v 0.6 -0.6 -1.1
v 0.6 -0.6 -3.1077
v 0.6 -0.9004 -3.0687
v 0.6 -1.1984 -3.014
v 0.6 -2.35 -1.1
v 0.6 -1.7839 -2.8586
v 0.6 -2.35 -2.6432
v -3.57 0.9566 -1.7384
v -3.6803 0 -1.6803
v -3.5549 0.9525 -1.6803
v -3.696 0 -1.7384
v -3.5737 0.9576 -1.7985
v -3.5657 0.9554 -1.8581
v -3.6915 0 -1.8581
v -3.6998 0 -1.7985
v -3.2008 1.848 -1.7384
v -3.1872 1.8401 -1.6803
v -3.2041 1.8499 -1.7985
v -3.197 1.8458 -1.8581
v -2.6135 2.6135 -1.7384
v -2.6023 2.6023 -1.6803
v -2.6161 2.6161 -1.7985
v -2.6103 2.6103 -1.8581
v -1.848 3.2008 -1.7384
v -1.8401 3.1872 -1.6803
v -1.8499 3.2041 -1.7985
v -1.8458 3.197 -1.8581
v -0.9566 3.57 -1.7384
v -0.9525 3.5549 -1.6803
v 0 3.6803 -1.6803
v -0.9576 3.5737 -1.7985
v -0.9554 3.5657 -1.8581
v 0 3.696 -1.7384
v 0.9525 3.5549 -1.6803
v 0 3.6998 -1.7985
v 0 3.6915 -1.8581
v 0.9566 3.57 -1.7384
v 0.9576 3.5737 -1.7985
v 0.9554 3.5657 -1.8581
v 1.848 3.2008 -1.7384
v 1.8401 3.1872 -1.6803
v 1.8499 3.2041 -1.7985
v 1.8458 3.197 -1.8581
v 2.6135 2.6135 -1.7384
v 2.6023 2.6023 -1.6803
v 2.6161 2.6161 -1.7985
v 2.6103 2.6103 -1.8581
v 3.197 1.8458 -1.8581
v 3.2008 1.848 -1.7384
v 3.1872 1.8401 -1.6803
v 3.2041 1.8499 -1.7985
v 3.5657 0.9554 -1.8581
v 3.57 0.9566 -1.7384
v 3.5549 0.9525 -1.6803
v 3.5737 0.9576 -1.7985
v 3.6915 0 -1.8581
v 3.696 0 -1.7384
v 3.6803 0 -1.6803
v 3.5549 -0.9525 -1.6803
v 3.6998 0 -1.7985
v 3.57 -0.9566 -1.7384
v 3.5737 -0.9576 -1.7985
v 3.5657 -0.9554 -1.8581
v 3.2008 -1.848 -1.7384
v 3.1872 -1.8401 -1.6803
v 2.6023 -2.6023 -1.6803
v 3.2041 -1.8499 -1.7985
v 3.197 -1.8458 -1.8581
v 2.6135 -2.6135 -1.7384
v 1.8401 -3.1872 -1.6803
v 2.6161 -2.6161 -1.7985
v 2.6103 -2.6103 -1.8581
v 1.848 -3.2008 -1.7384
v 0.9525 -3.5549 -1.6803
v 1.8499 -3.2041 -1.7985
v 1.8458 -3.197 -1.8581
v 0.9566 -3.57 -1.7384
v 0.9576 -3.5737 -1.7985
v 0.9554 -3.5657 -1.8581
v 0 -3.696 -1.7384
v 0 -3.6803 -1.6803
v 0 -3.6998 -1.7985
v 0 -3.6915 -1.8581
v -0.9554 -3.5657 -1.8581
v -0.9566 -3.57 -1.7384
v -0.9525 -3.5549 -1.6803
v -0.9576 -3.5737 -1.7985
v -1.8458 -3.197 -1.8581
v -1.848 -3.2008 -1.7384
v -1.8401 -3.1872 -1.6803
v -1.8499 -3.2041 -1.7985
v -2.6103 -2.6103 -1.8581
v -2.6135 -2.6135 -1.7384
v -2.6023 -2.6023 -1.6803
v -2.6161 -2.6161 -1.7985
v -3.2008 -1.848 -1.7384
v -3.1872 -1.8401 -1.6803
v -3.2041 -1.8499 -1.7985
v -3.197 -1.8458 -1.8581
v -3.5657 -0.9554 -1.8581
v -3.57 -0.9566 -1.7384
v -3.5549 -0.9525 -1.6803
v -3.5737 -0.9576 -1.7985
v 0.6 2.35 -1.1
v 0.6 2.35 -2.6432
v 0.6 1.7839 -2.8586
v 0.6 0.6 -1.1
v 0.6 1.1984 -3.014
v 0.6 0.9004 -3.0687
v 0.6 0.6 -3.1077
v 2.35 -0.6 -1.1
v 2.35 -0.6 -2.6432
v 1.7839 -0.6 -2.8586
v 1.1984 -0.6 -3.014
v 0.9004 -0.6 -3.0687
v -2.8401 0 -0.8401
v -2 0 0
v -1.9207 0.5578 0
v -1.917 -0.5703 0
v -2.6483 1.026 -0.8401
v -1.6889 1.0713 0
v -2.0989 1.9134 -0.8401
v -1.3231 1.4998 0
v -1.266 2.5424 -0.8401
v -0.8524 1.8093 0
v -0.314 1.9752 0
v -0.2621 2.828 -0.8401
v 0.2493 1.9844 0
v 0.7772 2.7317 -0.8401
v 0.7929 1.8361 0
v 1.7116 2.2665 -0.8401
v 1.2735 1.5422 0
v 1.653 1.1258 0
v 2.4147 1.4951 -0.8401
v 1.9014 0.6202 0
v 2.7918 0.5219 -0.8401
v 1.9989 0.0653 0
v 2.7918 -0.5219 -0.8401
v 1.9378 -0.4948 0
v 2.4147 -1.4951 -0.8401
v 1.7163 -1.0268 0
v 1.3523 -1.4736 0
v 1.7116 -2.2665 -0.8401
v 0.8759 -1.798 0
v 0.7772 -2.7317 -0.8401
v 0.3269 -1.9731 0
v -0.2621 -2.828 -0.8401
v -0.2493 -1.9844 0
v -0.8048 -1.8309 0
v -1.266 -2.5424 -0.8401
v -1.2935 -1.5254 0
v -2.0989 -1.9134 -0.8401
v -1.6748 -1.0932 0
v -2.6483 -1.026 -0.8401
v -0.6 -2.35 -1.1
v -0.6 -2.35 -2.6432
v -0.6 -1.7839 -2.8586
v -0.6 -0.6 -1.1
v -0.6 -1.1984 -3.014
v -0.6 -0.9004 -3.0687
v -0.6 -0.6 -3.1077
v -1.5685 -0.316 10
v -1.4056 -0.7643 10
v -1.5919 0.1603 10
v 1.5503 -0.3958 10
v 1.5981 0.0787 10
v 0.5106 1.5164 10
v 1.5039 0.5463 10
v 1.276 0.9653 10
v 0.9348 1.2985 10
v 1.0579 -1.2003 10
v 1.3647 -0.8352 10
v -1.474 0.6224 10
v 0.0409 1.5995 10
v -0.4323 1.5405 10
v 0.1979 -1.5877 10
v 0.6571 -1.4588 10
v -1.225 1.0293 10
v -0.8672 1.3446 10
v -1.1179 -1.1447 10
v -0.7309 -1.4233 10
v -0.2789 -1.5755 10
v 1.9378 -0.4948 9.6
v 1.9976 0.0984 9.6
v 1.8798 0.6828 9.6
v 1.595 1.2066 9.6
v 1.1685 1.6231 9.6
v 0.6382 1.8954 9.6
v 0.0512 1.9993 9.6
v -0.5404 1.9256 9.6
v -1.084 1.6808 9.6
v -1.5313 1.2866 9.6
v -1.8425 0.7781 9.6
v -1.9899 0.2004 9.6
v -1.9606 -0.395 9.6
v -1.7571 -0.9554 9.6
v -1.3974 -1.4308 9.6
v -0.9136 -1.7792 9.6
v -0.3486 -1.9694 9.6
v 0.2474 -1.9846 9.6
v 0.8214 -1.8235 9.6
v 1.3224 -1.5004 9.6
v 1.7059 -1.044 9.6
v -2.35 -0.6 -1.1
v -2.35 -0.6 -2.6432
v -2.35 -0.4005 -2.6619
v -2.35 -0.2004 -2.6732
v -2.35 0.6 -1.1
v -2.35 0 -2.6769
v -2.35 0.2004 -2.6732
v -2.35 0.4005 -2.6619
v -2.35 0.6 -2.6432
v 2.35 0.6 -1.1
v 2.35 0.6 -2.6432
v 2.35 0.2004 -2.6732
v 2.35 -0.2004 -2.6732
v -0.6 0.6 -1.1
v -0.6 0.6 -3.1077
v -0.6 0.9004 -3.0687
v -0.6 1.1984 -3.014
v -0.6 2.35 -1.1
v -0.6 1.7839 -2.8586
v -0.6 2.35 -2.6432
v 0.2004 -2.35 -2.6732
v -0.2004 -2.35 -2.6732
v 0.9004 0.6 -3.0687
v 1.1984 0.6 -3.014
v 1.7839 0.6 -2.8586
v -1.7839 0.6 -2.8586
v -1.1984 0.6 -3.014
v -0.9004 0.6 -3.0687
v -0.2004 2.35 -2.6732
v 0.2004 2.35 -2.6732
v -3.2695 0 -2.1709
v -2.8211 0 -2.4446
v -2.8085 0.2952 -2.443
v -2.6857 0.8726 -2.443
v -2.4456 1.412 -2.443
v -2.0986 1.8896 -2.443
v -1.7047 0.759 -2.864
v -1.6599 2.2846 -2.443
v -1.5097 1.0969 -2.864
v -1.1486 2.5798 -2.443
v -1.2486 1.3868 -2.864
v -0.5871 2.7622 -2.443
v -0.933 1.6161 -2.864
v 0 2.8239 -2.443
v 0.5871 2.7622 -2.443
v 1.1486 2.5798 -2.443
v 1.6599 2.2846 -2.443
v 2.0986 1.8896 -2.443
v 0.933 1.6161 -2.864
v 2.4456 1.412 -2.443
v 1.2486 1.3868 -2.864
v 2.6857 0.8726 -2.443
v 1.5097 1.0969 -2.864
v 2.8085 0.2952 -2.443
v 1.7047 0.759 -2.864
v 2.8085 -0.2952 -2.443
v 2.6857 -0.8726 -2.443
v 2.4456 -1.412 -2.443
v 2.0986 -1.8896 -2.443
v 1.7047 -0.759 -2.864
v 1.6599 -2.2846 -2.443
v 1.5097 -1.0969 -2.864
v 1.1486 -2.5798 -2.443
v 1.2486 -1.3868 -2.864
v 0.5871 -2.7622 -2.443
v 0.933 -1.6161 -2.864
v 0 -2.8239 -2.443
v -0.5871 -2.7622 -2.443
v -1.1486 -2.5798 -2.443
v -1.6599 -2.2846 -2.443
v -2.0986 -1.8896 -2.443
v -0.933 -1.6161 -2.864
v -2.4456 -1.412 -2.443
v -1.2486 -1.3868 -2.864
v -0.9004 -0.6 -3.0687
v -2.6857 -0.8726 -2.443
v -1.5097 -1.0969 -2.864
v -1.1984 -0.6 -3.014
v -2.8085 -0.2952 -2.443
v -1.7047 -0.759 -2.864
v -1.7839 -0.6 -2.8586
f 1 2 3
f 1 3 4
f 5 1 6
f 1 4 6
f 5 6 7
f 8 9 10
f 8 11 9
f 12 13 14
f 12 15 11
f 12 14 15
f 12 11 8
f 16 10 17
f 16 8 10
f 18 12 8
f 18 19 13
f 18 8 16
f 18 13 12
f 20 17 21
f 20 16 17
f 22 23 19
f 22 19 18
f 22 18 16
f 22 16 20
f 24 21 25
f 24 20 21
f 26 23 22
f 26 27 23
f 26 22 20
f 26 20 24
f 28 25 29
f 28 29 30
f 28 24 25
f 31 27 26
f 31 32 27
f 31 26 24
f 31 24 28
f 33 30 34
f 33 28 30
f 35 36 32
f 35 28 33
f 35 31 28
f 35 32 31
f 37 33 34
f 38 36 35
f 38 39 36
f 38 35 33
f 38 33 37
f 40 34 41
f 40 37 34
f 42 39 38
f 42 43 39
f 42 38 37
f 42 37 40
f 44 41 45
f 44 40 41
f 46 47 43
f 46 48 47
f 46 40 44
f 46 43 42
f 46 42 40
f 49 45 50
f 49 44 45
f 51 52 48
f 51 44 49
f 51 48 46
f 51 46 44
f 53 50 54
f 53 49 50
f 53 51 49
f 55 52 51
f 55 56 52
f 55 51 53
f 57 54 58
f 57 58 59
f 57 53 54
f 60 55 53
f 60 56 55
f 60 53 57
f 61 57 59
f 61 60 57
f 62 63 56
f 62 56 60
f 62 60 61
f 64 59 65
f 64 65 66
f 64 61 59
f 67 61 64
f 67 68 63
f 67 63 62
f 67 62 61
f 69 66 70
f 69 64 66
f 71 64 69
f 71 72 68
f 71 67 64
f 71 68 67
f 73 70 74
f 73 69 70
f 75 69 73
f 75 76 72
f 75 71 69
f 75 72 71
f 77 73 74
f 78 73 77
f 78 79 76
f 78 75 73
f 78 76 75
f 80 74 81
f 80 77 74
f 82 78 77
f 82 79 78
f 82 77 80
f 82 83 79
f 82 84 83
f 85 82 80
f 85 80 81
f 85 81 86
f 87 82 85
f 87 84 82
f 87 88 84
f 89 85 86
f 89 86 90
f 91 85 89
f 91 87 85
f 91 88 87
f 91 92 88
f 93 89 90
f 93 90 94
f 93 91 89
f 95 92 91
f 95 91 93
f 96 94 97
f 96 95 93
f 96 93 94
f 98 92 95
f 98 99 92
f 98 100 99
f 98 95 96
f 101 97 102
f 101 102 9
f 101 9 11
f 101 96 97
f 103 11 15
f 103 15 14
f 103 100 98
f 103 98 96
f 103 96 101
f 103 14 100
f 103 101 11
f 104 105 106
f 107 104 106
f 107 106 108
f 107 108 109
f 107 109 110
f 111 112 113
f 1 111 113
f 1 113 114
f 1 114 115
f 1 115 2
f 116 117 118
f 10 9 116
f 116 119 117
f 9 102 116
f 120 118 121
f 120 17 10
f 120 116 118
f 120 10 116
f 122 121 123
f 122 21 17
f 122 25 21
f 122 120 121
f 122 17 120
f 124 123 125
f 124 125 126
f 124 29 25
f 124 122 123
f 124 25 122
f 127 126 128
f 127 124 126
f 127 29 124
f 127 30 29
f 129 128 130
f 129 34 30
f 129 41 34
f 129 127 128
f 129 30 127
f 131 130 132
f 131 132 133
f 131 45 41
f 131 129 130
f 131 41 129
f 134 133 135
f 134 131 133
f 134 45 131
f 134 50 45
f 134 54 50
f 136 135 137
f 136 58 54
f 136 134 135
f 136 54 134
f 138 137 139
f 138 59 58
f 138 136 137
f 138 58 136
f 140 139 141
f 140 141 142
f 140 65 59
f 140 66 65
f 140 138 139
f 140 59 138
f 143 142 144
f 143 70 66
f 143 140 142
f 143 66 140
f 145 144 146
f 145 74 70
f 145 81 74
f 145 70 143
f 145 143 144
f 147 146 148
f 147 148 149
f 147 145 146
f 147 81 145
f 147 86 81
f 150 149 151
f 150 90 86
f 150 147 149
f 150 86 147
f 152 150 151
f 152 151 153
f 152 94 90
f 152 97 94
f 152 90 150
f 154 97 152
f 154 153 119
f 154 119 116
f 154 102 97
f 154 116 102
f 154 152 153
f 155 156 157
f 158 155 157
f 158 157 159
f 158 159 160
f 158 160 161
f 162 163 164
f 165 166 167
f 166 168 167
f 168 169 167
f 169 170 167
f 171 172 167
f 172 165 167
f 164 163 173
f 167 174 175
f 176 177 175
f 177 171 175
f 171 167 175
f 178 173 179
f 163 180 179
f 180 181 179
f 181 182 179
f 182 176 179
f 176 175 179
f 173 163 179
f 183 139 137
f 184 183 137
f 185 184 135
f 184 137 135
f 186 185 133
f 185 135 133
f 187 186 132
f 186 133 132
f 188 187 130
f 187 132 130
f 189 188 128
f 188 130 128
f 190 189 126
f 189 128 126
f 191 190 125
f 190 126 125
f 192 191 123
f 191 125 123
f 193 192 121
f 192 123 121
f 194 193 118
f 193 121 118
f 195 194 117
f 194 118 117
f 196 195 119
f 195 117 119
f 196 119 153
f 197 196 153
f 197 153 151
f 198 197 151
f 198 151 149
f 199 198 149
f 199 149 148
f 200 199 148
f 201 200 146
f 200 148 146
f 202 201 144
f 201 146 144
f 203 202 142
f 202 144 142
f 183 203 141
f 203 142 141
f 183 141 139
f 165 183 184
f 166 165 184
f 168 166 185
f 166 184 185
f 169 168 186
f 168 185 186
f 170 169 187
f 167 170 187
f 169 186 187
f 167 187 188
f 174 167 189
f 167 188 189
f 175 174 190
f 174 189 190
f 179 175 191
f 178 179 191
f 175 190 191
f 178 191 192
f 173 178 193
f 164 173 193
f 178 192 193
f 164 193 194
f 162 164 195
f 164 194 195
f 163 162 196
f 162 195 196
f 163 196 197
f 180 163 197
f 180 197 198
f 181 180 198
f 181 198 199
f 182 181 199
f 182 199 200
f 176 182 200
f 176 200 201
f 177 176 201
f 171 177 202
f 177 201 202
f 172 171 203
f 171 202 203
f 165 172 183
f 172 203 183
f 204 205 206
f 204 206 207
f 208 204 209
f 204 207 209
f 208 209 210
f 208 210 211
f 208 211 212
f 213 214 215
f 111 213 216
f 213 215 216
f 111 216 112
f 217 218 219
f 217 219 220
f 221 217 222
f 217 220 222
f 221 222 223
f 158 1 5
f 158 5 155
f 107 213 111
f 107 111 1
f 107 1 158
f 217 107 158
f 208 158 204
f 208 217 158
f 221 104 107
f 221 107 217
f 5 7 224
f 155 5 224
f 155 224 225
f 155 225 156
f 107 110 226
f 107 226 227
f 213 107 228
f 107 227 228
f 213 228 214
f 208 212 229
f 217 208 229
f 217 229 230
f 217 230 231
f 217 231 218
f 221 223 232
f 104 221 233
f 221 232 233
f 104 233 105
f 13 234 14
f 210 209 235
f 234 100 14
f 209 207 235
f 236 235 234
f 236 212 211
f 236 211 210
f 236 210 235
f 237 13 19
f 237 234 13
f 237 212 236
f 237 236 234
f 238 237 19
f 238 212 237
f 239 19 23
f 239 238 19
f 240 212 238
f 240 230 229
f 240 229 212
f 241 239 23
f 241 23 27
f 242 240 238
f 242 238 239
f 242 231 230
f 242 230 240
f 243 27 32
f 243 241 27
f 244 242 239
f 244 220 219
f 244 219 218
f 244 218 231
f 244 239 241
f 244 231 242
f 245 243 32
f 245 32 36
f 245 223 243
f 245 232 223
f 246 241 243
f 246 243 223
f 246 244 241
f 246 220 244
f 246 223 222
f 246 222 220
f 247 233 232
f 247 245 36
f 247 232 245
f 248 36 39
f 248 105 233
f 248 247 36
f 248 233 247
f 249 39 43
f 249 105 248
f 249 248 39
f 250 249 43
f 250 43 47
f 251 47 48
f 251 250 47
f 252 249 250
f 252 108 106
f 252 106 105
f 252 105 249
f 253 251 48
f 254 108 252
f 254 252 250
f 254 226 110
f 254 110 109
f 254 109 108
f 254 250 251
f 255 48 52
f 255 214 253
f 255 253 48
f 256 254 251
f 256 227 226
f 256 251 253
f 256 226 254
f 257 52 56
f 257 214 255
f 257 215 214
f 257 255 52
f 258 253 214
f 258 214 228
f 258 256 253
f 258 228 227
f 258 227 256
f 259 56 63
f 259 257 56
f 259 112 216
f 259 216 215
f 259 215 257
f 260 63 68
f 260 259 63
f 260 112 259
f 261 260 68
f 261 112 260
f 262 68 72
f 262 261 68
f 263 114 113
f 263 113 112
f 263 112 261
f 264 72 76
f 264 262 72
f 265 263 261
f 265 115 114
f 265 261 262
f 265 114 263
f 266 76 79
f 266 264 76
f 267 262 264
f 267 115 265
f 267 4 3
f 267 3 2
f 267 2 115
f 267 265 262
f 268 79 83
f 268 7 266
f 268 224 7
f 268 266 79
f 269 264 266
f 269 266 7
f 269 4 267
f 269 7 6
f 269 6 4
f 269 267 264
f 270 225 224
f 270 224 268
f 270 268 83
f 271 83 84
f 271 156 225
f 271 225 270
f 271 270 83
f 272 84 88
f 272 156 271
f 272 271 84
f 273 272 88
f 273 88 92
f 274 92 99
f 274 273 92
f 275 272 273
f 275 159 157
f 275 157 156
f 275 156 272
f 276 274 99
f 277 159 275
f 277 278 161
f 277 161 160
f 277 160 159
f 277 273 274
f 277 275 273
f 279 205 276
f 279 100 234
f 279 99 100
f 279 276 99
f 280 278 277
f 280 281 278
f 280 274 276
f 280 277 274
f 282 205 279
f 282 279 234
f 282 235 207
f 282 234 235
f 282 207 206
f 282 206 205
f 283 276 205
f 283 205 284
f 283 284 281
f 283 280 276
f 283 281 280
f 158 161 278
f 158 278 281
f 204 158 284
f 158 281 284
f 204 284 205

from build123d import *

# Parameters (mm, degrees)
ENLEV_MAT_EXTRU_1_DEPTH      = 1
ENLEV_MAT_EXTRU_1_DEPTH_BACK = 10
ESQUISSE3_W                  = 2
ESQUISSE3_H                  = 10
CHANFREIN1_SIZE              = 0.4
ENL_V_MAT_EXTRU_1_DEPTH      = 1


with BuildPart() as part:
    # Esquisse1 → Base-Révolution (revolve)
    with BuildSketch(Plane(origin=(0, 0, 0), x_dir=(1, 0, 0), z_dir=(0, 1, 0))):
        with BuildLine():
            Line((0, 0), (2, 0))
            Line((2, 0), (3.680261609, 1.680261609))
            ThreePointArc((3.680261609, 1.680261609), (3.699400389, 1.768324283), (3.691522185, 1.858097672))
            ThreePointArc((3.691522185, 1.858097672), (1.958780857, 2.831960417), (0, 3.169567743))
            Line((0, 3.169567743), (0, 0))
        make_face()
    revolve(axis=Axis((0, 0, 0), (0, 0, -1)))

    # Esquisse2 → Enlev. mat.-Extru.1 (cut, two sides: drawn at the far end of the back side and taken through both)
    with BuildSketch(Plane.XY.offset(-3.1).offset(-ENLEV_MAT_EXTRU_1_DEPTH_BACK)):
        Polygon((0.6, -0.6), (0.6, -2.35), (-0.6, -2.35), (-0.6, -0.6), (-2.35, -0.6), (-2.35, 0.6), (-0.6, 0.6), (-0.6, 2.35), (0.6, 2.35), (0.6, 0.6), (2.35, 0.6), (2.35, -0.6), align=None)
    extrude(amount=ENLEV_MAT_EXTRU_1_DEPTH + ENLEV_MAT_EXTRU_1_DEPTH_BACK, mode=Mode.SUBTRACT)

    # Esquisse3 → Boss.-Révol.1 (revolve)
    with BuildSketch(Plane(origin=(0, 0, 0), x_dir=(1, 0, 0), z_dir=(0, 1, 0))):
        with Locations((1, -5)):
            Rectangle(ESQUISSE3_W, ESQUISSE3_H)
    revolve(axis=Axis((0, 0, 0), (0, 0, 1)))

    # Chanfrein1
    chanfrein1_edges = [part.edges().sort_by_distance(p)[0] for p in [
        (-2, 0, 10),
    ]]
    chamfer(chanfrein1_edges, length=CHANFREIN1_SIZE)

    # Esquisse6 → Enlèv. mat.-Extru.1 (cut)
    with BuildSketch(Plane(origin=(0, 0, -2.1), x_dir=(-1, 0, 0), z_dir=(0, 0, -1))):
        Polygon((2.35, 0.6), (0.6, 0.6), (0.6, 2.35), (-0.6, 2.35), (-0.6, 0.6), (-2.35, 0.6), (-2.35, -0.6), (-0.6, -0.6), (-0.6, -2.35), (0.6, -2.35), (0.6, -0.6), (2.35, -0.6), align=None)
    extrude(amount=-ENL_V_MAT_EXTRU_1_DEPTH, mode=Mode.SUBTRACT)


solid = part.part
